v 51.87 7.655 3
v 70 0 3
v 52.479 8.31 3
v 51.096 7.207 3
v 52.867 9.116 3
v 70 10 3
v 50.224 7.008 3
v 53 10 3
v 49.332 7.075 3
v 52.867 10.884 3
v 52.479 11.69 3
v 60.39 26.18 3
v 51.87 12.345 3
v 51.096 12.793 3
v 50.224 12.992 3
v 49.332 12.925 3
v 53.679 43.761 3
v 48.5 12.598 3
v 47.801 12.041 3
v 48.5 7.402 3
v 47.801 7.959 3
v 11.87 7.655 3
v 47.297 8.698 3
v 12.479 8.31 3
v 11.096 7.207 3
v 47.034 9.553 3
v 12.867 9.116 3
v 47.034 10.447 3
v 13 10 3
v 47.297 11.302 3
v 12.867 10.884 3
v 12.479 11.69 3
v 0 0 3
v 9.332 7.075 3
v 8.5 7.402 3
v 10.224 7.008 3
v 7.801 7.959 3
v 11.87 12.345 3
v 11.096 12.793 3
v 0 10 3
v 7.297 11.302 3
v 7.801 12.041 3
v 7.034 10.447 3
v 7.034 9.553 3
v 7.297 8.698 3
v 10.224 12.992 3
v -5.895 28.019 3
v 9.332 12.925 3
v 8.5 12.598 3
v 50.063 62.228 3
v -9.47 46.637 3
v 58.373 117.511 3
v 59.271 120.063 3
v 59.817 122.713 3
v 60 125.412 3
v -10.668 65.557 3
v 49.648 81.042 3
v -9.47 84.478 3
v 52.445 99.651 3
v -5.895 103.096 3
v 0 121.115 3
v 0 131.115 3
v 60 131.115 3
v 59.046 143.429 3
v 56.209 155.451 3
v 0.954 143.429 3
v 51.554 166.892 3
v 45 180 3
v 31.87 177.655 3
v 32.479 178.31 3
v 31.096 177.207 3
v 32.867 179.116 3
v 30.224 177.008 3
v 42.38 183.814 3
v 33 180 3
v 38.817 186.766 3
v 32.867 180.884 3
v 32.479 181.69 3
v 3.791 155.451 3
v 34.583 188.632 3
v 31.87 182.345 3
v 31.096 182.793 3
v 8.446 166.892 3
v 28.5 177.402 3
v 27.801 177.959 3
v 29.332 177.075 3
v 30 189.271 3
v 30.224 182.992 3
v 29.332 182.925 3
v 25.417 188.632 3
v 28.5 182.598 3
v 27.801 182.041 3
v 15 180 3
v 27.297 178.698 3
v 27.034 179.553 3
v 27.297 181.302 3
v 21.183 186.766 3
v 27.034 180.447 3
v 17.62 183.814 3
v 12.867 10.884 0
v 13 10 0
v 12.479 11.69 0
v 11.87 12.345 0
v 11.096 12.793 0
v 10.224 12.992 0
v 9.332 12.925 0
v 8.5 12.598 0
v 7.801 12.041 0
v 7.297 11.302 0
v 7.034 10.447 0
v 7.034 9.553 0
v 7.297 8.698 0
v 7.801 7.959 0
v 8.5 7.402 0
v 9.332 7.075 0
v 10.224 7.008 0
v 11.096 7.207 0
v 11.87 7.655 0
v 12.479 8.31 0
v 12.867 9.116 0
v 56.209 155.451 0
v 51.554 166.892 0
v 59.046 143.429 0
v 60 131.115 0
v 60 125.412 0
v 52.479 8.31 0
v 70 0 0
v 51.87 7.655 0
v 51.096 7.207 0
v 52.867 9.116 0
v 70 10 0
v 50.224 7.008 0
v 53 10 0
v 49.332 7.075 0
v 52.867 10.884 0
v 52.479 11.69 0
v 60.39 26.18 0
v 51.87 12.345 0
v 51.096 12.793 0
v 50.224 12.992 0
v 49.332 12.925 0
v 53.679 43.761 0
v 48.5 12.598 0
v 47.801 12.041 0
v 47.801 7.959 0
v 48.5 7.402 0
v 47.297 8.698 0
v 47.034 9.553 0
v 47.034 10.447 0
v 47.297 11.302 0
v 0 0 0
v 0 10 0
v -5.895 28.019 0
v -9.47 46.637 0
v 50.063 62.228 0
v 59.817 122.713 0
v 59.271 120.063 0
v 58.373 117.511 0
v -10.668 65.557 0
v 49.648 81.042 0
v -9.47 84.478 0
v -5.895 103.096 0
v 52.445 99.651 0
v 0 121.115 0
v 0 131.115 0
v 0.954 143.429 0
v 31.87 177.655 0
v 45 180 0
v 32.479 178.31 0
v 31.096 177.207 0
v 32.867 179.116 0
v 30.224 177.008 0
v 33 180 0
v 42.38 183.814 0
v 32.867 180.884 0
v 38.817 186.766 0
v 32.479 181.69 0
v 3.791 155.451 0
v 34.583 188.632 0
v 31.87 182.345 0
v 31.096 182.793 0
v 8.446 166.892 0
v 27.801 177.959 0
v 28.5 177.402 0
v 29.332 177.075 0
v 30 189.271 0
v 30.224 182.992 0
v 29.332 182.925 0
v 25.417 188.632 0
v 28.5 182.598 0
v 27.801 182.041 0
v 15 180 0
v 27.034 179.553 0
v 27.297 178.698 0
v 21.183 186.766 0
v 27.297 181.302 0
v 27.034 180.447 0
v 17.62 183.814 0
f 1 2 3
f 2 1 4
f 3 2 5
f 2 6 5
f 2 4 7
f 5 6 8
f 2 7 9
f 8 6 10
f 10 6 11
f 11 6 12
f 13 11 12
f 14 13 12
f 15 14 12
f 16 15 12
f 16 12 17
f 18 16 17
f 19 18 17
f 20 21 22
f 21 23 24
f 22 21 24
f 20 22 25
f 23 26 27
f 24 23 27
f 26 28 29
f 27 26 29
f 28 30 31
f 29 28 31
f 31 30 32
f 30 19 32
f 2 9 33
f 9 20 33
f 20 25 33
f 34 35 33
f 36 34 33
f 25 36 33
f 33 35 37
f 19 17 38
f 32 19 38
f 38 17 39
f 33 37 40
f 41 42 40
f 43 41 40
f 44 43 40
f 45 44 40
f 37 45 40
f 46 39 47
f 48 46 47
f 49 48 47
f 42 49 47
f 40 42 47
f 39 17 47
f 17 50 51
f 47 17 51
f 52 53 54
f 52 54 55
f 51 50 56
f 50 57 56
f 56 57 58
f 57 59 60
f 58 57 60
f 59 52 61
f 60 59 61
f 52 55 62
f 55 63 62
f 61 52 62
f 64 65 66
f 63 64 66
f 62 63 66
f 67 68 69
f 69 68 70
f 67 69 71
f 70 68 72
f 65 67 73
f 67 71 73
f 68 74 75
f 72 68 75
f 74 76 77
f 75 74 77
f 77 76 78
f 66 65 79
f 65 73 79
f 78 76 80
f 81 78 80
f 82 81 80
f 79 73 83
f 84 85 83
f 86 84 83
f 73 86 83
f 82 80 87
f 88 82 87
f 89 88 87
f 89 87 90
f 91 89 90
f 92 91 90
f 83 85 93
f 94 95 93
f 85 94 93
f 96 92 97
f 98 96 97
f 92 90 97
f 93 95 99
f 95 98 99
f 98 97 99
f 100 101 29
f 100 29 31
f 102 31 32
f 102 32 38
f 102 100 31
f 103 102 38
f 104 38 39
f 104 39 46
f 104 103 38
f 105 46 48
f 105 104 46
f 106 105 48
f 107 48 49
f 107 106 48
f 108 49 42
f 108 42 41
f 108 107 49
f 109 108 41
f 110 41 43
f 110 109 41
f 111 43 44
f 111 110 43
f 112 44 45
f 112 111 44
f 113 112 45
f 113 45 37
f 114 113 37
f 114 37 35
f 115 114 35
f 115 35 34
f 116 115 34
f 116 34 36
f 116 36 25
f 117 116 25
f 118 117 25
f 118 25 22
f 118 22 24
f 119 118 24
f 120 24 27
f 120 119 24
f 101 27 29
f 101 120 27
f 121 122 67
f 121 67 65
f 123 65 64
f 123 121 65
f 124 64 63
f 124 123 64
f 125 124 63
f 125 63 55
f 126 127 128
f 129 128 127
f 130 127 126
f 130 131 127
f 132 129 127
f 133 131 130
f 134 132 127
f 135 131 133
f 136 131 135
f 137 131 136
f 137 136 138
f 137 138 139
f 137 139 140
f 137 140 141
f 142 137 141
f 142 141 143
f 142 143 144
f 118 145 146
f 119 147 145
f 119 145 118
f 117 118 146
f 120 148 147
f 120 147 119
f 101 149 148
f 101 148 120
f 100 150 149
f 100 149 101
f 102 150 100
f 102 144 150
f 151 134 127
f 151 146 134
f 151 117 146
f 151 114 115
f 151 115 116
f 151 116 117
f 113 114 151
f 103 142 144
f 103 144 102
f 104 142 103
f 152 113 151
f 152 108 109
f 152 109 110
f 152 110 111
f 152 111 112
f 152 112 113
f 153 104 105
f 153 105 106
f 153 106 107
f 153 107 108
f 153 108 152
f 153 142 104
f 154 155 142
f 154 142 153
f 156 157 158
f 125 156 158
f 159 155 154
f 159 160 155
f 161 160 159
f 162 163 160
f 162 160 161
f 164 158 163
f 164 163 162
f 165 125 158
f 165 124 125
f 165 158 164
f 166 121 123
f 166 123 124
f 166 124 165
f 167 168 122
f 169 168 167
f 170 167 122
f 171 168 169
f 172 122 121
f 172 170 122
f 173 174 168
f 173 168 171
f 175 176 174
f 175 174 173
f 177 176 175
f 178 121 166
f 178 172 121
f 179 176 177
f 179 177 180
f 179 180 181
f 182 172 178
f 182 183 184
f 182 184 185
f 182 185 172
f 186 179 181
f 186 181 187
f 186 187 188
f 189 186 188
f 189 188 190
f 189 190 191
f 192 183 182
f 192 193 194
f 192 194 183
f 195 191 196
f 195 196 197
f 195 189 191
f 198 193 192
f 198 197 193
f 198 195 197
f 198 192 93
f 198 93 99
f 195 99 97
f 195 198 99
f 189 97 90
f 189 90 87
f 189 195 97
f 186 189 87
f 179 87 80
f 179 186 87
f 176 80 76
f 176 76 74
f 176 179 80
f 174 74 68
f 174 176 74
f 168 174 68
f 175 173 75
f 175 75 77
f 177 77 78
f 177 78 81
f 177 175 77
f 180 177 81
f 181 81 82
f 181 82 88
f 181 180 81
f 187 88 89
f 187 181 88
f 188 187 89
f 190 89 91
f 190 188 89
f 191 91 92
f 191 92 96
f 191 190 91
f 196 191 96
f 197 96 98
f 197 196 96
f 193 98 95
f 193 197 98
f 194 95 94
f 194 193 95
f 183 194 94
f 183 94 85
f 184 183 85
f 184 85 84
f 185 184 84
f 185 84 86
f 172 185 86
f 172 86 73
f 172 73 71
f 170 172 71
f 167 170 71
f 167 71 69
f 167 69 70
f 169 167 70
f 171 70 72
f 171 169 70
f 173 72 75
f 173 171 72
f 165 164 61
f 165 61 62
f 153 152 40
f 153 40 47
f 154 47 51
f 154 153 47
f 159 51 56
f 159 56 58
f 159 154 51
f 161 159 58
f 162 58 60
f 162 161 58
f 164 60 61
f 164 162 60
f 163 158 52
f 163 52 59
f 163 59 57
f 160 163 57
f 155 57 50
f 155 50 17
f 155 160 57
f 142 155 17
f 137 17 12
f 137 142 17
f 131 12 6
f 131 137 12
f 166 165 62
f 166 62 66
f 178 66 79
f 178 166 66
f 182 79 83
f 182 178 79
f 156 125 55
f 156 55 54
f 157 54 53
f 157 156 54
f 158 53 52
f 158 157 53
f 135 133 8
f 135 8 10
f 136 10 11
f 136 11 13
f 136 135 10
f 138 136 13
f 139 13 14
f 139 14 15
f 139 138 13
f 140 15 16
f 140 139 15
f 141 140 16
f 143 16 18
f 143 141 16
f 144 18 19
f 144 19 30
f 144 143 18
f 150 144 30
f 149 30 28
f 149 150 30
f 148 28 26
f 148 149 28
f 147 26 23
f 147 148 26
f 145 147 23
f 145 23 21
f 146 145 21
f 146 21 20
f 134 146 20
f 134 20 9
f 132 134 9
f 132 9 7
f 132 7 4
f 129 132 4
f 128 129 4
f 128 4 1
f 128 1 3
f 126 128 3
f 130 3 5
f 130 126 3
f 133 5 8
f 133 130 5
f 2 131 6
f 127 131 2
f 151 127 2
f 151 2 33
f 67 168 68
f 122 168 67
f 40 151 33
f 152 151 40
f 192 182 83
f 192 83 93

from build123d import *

# Parameters (mm, degrees)
SKETCH_1_R      = 3
EXTRUDE_1_DEPTH = 3


with BuildPart() as part:
    # 草图1 → 凸台-拉伸1 (new body)
    with BuildSketch(Plane.XY):
        with BuildLine():
            Line((8.44582472, 166.89164944), (15, 180))
            ThreePointArc((15, 180), (30, 189.270509831), (45, 180))
            Line((45, 180), (51.55417528, 166.89164944))
            ThreePointArc((51.55417528, 166.89164944), (57.859919157, 149.494795444), (60, 131.1145618))
            Line((60, 131.1145618), (60, 125.412430481))
            ThreePointArc((60, 125.412430481), (59.589066182, 121.379009336), (58.373151387, 117.511335106))
            ThreePointArc((58.373151387, 117.511335106), (50.063143822, 62.228284379), (70, 10))
            Line((70, 10), (70, 0))
            Line((70, 0), (60, 0))
            Line((60, 0), (0, 0))
            Line((0, 0), (0, 10))
            ThreePointArc((0, 10), (-10.668063464, 65.5572809), (0, 121.1145618))
            Line((0, 121.1145618), (0, 131.1145618))
            ThreePointArc((0, 131.1145618), (2.140080843, 149.494795444), (8.44582472, 166.89164944))
        make_face()
        with Locations((10, 10)):
            Circle(SKETCH_1_R, mode=Mode.SUBTRACT)
        with Locations((50, 10)):
            Circle(SKETCH_1_R, mode=Mode.SUBTRACT)
        with Locations((30, 180)):
            Circle(SKETCH_1_R, mode=Mode.SUBTRACT)
    extrude(amount=EXTRUDE_1_DEPTH)


solid = part.part
